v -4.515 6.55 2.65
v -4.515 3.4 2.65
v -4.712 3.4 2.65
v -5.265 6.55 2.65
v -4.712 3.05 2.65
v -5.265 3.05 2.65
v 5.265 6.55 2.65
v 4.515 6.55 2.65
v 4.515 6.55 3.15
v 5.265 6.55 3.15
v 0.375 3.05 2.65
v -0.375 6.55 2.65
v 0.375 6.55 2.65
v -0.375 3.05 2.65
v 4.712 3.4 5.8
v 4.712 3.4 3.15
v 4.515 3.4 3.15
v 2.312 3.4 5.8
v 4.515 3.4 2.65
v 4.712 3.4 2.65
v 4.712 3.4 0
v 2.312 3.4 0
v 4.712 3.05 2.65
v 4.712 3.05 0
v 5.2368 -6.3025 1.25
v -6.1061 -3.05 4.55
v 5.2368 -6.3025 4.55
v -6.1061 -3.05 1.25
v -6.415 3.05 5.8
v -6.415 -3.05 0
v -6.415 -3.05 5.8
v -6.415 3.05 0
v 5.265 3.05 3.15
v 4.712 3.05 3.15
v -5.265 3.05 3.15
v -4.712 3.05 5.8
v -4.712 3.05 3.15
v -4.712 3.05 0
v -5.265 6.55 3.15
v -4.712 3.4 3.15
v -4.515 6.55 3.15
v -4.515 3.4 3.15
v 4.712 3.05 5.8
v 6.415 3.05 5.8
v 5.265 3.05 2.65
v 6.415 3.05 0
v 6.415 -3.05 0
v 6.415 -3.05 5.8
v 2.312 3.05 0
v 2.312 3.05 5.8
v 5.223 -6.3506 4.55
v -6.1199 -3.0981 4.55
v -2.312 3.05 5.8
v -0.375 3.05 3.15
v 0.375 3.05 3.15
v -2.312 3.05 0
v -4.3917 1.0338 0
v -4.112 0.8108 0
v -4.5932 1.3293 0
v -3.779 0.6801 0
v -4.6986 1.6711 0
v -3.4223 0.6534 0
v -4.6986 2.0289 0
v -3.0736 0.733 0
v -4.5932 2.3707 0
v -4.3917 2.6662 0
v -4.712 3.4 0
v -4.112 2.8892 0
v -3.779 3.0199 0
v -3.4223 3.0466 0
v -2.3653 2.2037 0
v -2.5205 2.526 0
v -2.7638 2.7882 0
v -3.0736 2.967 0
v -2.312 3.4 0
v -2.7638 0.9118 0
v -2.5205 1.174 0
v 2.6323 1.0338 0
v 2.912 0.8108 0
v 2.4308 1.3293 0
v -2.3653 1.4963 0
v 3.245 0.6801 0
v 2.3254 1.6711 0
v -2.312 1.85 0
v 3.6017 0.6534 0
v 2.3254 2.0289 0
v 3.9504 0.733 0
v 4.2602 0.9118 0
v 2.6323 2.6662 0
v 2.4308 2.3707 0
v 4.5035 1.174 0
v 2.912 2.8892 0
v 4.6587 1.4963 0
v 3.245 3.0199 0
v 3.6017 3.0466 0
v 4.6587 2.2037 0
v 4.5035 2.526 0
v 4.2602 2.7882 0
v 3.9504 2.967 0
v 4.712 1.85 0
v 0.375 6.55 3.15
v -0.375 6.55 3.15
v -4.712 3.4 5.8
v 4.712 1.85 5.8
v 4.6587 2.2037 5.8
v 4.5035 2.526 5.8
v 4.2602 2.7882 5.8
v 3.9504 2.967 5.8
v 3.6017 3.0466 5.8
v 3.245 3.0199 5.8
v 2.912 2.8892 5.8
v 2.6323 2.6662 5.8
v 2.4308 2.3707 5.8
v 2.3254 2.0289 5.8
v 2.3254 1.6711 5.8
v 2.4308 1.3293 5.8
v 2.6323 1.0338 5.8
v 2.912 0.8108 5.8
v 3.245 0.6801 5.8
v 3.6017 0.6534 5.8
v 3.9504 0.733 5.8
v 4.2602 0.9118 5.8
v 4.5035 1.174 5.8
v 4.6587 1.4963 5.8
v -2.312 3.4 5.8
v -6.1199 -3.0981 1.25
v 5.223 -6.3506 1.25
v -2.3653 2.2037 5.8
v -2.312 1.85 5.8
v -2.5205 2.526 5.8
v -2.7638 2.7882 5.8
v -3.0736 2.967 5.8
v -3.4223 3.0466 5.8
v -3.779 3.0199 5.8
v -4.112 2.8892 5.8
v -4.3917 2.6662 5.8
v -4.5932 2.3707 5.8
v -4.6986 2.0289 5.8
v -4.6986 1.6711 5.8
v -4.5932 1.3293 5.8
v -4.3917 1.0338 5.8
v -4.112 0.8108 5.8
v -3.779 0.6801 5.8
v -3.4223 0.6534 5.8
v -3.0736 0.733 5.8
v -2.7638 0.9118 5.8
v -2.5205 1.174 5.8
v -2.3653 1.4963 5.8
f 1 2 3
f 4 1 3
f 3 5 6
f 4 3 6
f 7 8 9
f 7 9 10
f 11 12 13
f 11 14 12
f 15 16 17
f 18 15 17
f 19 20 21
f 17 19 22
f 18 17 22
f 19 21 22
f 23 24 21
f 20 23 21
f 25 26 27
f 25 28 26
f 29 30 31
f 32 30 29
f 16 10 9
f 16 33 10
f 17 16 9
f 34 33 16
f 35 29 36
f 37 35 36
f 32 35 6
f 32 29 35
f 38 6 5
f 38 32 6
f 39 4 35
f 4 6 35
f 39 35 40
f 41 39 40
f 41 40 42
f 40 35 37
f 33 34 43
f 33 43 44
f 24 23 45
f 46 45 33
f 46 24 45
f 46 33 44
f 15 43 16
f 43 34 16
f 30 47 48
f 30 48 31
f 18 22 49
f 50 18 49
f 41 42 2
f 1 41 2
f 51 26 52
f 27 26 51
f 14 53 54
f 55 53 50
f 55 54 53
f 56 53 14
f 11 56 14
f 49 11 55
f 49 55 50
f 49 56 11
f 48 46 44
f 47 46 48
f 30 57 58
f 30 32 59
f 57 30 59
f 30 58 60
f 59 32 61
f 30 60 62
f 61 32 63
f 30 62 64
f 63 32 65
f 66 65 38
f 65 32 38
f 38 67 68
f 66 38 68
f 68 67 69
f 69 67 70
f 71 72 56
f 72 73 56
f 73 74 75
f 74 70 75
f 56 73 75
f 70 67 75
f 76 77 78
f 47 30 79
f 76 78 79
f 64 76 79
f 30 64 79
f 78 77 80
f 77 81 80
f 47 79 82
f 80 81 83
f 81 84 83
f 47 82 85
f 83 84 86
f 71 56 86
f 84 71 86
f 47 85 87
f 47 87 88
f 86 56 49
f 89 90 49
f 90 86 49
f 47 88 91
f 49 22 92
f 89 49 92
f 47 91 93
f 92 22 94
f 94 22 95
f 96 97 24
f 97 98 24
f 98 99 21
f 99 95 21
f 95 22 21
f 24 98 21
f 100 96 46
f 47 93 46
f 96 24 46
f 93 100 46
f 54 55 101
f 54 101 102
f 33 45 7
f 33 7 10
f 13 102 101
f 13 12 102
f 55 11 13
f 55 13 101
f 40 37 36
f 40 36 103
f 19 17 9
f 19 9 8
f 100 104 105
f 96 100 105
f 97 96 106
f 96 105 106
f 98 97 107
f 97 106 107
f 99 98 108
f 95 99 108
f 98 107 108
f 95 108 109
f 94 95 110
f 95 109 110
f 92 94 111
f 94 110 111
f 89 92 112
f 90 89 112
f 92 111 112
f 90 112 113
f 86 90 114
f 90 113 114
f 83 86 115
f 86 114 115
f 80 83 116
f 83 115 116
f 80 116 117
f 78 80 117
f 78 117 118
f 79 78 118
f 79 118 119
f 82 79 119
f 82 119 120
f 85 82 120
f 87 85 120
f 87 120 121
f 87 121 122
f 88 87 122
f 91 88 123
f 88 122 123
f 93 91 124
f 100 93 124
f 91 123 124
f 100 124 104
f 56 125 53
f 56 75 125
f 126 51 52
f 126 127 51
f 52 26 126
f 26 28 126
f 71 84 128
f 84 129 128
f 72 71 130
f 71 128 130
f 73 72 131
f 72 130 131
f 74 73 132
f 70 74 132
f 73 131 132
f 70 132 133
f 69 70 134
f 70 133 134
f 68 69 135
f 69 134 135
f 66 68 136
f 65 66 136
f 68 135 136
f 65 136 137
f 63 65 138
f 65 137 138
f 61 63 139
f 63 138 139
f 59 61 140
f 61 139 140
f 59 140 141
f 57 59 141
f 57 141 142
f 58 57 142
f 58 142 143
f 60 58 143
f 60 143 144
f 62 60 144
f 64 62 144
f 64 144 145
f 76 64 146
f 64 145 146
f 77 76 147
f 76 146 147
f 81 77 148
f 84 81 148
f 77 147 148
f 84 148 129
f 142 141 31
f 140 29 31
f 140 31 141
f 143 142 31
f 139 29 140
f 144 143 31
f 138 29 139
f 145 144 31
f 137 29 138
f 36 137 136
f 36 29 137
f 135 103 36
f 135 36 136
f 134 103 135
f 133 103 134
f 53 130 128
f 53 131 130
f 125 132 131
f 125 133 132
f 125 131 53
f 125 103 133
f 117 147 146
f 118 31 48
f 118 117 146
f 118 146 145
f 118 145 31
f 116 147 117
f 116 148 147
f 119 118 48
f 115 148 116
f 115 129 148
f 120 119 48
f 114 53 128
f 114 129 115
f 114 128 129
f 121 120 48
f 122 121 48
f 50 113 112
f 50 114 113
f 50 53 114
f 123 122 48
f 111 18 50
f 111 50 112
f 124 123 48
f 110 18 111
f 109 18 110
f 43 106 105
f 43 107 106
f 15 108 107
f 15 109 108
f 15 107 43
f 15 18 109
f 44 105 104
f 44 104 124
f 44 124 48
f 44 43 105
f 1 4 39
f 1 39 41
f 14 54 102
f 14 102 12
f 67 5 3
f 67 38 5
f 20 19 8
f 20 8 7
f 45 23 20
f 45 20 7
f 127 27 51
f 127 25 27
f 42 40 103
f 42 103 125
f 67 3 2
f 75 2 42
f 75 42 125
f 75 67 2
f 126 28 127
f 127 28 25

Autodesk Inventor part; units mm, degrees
ref_plane "YZ Plane" through (0, 0, 0) normal (1, 0, 0) x (0, 1, 0)
ref_plane "XZ Plane" through (0, 0, 0) normal (0, 1, 0) x (-1, 0, 0)
sketch "Sketch1" plane through (0, 0, 0) normal (0, 0, 1) x (1, 0, 0)
  line L0 (6.415, 3.05) -> (6.415, -3.05)
  line L1 (6.415, -3.05) -> (-6.415, -3.05)
  line L2 (-6.415, -3.05) -> (-6.415, 3.05)
  line L3 (-4.712, 3.05) -> (-4.712, 3.4)
  line L4 (-4.712, 3.4) -> (-2.312, 3.4)
  line L5 (-2.312, 3.4) -> (-2.312, 3.05)
  line L6 (-6.415, 3.05) -> (-4.712, 3.05)
  line L7 (0, -4.34) -> (0, 4.69) construction
  line L8 (4.712, 3.05) -> (4.712, 3.4)
  line L9 (4.712, 3.4) -> (2.312, 3.4)
  line L10 (2.312, 3.4) -> (2.312, 3.05)
  line L11 (-2.312, 3.05) -> (2.312, 3.05)
  line L12 (4.712, 3.05) -> (6.415, 3.05)
  point P0 (0, 0)
  point P1 (0, 3.05)
  point P2 (6.415, 0)
  dimension "d0" = 12.83
  dimension "d1" = 6.1
  dimension "d4" = 0.35
  dimension "d5" = 2.4
extrude "Extrusion1" add sketch "Sketch1" along normal blind 5.8
sketch "Sketch2" plane through (0, 0, 5.8) normal (0, 0, 1) x (1, 0, 0)
  circle A0 centre (-3.512, 1.85) radius 1.2
  line L0 (-2.312, 3.4) -> (-4.712, 3.4) construction
  line L1 (0, -4.34) -> (0, 4.69) construction
  line L2 (2.312, 3.05) -> (-2.312, 3.05) projected
  circle A1 centre (3.512, 1.85) radius 1.2
  line L3 (-4.712, 3.4) -> (-4.712, 3.05) projected
  line L4 (-2.312, 3.05) -> (-2.312, 3.4) projected
  point P0 (0, 0)
  point P1 (-3.512, 3.4)
extrude "Extrusion2" cut sketch "Sketch2" against normal through all
sketch "Sketch3" plane through (-2.312, 3.05, 0) normal (0, 1, 0) x (1, 0, 0)
  line L0 (6.827, -2.65) -> (7.577, -2.65)
  line L1 (7.577, -2.65) -> (7.577, -3.15)
  line L2 (7.577, -3.15) -> (6.827, -3.15)
  line L3 (6.827, -3.15) -> (6.827, -2.65)
  line L4 (8.727, 0) -> (7.024, 0) construction
  line L5 (8.727, 0) -> (8.727, -5.8) construction
  line L6 (-2.203, -2.65) -> (-2.953, -2.65)
  line L7 (-2.953, -2.65) -> (-2.953, -3.15)
  line L8 (-2.953, -3.15) -> (-2.203, -3.15)
  line L9 (-2.203, -3.15) -> (-2.203, -2.65)
  line L10 (1.937, -2.65) -> (2.687, -2.65)
  line L11 (2.687, -2.65) -> (2.687, -3.15)
  line L12 (2.687, -3.15) -> (1.937, -3.15)
  line L13 (1.937, -3.15) -> (1.937, -2.65)
  line L14 (-6.669, 0) -> (11.293, 0) construction
  line L15 (-4.103, 0) -> (-4.103, -5.8) projected
  line L16 (-4.103, -2.9) -> (8.727, -2.9) construction
  line L17 (2.312, 0) -> (2.312, -5.8) construction
  line L18 (-4.103, -5.8) -> (8.727, -5.8) construction
  point P0 (7.577, -2.9)
  point P1 (2.687, -2.9)
  point P2 (2.312, -2.9)
  point P3 (2.312, -2.9)
  point P4 (-2.953, -2.9)
  point P5 (2.312, -2.65)
  dimension "d10" = 0.75
  dimension "d11" = 0.5
  dimension "d12" = 1.15
extrude "Extrusion3" add sketch "Sketch3" along normal blind 3.5
ref_plane "Work Plane1" through (0, 0, 2.9) normal (0, 0, 1) x (1, 0, 0)
sketch "Sketch5" plane through (0, 0, 2.9) normal (0, 0, 1) x (1, 0, 0)
  line L0 (-6.415, -3.05) -> (6.415, -3.05) construction
  line L1 (-6.1061, -3.05) -> (5.2368, -6.3025)
  line L2 (-6.1061, -3.05) -> (5.6939, -3.05) construction
  line L3 (5.2368, -6.3025) -> (5.223, -6.3506)
  line L4 (5.2368, -6.3025) -> (5.2868, -6.3025) construction
  line L5 (5.223, -6.3506) -> (-6.1199, -3.0981)
  line L6 (-6.1061, -3.05) -> (-6.1199, -3.0981)
  point P0 (0, 0)
  dimension "d17" = 11.8
  dimension "d18" = 16
  dimension "d19" = 0.05
  dimension "d20" = 106
  dimension "d21" = 11.8
extrude "Extrusion4" add sketch "Sketch5" along normal mid plane 3.3
properties part number "EndSwitch"
